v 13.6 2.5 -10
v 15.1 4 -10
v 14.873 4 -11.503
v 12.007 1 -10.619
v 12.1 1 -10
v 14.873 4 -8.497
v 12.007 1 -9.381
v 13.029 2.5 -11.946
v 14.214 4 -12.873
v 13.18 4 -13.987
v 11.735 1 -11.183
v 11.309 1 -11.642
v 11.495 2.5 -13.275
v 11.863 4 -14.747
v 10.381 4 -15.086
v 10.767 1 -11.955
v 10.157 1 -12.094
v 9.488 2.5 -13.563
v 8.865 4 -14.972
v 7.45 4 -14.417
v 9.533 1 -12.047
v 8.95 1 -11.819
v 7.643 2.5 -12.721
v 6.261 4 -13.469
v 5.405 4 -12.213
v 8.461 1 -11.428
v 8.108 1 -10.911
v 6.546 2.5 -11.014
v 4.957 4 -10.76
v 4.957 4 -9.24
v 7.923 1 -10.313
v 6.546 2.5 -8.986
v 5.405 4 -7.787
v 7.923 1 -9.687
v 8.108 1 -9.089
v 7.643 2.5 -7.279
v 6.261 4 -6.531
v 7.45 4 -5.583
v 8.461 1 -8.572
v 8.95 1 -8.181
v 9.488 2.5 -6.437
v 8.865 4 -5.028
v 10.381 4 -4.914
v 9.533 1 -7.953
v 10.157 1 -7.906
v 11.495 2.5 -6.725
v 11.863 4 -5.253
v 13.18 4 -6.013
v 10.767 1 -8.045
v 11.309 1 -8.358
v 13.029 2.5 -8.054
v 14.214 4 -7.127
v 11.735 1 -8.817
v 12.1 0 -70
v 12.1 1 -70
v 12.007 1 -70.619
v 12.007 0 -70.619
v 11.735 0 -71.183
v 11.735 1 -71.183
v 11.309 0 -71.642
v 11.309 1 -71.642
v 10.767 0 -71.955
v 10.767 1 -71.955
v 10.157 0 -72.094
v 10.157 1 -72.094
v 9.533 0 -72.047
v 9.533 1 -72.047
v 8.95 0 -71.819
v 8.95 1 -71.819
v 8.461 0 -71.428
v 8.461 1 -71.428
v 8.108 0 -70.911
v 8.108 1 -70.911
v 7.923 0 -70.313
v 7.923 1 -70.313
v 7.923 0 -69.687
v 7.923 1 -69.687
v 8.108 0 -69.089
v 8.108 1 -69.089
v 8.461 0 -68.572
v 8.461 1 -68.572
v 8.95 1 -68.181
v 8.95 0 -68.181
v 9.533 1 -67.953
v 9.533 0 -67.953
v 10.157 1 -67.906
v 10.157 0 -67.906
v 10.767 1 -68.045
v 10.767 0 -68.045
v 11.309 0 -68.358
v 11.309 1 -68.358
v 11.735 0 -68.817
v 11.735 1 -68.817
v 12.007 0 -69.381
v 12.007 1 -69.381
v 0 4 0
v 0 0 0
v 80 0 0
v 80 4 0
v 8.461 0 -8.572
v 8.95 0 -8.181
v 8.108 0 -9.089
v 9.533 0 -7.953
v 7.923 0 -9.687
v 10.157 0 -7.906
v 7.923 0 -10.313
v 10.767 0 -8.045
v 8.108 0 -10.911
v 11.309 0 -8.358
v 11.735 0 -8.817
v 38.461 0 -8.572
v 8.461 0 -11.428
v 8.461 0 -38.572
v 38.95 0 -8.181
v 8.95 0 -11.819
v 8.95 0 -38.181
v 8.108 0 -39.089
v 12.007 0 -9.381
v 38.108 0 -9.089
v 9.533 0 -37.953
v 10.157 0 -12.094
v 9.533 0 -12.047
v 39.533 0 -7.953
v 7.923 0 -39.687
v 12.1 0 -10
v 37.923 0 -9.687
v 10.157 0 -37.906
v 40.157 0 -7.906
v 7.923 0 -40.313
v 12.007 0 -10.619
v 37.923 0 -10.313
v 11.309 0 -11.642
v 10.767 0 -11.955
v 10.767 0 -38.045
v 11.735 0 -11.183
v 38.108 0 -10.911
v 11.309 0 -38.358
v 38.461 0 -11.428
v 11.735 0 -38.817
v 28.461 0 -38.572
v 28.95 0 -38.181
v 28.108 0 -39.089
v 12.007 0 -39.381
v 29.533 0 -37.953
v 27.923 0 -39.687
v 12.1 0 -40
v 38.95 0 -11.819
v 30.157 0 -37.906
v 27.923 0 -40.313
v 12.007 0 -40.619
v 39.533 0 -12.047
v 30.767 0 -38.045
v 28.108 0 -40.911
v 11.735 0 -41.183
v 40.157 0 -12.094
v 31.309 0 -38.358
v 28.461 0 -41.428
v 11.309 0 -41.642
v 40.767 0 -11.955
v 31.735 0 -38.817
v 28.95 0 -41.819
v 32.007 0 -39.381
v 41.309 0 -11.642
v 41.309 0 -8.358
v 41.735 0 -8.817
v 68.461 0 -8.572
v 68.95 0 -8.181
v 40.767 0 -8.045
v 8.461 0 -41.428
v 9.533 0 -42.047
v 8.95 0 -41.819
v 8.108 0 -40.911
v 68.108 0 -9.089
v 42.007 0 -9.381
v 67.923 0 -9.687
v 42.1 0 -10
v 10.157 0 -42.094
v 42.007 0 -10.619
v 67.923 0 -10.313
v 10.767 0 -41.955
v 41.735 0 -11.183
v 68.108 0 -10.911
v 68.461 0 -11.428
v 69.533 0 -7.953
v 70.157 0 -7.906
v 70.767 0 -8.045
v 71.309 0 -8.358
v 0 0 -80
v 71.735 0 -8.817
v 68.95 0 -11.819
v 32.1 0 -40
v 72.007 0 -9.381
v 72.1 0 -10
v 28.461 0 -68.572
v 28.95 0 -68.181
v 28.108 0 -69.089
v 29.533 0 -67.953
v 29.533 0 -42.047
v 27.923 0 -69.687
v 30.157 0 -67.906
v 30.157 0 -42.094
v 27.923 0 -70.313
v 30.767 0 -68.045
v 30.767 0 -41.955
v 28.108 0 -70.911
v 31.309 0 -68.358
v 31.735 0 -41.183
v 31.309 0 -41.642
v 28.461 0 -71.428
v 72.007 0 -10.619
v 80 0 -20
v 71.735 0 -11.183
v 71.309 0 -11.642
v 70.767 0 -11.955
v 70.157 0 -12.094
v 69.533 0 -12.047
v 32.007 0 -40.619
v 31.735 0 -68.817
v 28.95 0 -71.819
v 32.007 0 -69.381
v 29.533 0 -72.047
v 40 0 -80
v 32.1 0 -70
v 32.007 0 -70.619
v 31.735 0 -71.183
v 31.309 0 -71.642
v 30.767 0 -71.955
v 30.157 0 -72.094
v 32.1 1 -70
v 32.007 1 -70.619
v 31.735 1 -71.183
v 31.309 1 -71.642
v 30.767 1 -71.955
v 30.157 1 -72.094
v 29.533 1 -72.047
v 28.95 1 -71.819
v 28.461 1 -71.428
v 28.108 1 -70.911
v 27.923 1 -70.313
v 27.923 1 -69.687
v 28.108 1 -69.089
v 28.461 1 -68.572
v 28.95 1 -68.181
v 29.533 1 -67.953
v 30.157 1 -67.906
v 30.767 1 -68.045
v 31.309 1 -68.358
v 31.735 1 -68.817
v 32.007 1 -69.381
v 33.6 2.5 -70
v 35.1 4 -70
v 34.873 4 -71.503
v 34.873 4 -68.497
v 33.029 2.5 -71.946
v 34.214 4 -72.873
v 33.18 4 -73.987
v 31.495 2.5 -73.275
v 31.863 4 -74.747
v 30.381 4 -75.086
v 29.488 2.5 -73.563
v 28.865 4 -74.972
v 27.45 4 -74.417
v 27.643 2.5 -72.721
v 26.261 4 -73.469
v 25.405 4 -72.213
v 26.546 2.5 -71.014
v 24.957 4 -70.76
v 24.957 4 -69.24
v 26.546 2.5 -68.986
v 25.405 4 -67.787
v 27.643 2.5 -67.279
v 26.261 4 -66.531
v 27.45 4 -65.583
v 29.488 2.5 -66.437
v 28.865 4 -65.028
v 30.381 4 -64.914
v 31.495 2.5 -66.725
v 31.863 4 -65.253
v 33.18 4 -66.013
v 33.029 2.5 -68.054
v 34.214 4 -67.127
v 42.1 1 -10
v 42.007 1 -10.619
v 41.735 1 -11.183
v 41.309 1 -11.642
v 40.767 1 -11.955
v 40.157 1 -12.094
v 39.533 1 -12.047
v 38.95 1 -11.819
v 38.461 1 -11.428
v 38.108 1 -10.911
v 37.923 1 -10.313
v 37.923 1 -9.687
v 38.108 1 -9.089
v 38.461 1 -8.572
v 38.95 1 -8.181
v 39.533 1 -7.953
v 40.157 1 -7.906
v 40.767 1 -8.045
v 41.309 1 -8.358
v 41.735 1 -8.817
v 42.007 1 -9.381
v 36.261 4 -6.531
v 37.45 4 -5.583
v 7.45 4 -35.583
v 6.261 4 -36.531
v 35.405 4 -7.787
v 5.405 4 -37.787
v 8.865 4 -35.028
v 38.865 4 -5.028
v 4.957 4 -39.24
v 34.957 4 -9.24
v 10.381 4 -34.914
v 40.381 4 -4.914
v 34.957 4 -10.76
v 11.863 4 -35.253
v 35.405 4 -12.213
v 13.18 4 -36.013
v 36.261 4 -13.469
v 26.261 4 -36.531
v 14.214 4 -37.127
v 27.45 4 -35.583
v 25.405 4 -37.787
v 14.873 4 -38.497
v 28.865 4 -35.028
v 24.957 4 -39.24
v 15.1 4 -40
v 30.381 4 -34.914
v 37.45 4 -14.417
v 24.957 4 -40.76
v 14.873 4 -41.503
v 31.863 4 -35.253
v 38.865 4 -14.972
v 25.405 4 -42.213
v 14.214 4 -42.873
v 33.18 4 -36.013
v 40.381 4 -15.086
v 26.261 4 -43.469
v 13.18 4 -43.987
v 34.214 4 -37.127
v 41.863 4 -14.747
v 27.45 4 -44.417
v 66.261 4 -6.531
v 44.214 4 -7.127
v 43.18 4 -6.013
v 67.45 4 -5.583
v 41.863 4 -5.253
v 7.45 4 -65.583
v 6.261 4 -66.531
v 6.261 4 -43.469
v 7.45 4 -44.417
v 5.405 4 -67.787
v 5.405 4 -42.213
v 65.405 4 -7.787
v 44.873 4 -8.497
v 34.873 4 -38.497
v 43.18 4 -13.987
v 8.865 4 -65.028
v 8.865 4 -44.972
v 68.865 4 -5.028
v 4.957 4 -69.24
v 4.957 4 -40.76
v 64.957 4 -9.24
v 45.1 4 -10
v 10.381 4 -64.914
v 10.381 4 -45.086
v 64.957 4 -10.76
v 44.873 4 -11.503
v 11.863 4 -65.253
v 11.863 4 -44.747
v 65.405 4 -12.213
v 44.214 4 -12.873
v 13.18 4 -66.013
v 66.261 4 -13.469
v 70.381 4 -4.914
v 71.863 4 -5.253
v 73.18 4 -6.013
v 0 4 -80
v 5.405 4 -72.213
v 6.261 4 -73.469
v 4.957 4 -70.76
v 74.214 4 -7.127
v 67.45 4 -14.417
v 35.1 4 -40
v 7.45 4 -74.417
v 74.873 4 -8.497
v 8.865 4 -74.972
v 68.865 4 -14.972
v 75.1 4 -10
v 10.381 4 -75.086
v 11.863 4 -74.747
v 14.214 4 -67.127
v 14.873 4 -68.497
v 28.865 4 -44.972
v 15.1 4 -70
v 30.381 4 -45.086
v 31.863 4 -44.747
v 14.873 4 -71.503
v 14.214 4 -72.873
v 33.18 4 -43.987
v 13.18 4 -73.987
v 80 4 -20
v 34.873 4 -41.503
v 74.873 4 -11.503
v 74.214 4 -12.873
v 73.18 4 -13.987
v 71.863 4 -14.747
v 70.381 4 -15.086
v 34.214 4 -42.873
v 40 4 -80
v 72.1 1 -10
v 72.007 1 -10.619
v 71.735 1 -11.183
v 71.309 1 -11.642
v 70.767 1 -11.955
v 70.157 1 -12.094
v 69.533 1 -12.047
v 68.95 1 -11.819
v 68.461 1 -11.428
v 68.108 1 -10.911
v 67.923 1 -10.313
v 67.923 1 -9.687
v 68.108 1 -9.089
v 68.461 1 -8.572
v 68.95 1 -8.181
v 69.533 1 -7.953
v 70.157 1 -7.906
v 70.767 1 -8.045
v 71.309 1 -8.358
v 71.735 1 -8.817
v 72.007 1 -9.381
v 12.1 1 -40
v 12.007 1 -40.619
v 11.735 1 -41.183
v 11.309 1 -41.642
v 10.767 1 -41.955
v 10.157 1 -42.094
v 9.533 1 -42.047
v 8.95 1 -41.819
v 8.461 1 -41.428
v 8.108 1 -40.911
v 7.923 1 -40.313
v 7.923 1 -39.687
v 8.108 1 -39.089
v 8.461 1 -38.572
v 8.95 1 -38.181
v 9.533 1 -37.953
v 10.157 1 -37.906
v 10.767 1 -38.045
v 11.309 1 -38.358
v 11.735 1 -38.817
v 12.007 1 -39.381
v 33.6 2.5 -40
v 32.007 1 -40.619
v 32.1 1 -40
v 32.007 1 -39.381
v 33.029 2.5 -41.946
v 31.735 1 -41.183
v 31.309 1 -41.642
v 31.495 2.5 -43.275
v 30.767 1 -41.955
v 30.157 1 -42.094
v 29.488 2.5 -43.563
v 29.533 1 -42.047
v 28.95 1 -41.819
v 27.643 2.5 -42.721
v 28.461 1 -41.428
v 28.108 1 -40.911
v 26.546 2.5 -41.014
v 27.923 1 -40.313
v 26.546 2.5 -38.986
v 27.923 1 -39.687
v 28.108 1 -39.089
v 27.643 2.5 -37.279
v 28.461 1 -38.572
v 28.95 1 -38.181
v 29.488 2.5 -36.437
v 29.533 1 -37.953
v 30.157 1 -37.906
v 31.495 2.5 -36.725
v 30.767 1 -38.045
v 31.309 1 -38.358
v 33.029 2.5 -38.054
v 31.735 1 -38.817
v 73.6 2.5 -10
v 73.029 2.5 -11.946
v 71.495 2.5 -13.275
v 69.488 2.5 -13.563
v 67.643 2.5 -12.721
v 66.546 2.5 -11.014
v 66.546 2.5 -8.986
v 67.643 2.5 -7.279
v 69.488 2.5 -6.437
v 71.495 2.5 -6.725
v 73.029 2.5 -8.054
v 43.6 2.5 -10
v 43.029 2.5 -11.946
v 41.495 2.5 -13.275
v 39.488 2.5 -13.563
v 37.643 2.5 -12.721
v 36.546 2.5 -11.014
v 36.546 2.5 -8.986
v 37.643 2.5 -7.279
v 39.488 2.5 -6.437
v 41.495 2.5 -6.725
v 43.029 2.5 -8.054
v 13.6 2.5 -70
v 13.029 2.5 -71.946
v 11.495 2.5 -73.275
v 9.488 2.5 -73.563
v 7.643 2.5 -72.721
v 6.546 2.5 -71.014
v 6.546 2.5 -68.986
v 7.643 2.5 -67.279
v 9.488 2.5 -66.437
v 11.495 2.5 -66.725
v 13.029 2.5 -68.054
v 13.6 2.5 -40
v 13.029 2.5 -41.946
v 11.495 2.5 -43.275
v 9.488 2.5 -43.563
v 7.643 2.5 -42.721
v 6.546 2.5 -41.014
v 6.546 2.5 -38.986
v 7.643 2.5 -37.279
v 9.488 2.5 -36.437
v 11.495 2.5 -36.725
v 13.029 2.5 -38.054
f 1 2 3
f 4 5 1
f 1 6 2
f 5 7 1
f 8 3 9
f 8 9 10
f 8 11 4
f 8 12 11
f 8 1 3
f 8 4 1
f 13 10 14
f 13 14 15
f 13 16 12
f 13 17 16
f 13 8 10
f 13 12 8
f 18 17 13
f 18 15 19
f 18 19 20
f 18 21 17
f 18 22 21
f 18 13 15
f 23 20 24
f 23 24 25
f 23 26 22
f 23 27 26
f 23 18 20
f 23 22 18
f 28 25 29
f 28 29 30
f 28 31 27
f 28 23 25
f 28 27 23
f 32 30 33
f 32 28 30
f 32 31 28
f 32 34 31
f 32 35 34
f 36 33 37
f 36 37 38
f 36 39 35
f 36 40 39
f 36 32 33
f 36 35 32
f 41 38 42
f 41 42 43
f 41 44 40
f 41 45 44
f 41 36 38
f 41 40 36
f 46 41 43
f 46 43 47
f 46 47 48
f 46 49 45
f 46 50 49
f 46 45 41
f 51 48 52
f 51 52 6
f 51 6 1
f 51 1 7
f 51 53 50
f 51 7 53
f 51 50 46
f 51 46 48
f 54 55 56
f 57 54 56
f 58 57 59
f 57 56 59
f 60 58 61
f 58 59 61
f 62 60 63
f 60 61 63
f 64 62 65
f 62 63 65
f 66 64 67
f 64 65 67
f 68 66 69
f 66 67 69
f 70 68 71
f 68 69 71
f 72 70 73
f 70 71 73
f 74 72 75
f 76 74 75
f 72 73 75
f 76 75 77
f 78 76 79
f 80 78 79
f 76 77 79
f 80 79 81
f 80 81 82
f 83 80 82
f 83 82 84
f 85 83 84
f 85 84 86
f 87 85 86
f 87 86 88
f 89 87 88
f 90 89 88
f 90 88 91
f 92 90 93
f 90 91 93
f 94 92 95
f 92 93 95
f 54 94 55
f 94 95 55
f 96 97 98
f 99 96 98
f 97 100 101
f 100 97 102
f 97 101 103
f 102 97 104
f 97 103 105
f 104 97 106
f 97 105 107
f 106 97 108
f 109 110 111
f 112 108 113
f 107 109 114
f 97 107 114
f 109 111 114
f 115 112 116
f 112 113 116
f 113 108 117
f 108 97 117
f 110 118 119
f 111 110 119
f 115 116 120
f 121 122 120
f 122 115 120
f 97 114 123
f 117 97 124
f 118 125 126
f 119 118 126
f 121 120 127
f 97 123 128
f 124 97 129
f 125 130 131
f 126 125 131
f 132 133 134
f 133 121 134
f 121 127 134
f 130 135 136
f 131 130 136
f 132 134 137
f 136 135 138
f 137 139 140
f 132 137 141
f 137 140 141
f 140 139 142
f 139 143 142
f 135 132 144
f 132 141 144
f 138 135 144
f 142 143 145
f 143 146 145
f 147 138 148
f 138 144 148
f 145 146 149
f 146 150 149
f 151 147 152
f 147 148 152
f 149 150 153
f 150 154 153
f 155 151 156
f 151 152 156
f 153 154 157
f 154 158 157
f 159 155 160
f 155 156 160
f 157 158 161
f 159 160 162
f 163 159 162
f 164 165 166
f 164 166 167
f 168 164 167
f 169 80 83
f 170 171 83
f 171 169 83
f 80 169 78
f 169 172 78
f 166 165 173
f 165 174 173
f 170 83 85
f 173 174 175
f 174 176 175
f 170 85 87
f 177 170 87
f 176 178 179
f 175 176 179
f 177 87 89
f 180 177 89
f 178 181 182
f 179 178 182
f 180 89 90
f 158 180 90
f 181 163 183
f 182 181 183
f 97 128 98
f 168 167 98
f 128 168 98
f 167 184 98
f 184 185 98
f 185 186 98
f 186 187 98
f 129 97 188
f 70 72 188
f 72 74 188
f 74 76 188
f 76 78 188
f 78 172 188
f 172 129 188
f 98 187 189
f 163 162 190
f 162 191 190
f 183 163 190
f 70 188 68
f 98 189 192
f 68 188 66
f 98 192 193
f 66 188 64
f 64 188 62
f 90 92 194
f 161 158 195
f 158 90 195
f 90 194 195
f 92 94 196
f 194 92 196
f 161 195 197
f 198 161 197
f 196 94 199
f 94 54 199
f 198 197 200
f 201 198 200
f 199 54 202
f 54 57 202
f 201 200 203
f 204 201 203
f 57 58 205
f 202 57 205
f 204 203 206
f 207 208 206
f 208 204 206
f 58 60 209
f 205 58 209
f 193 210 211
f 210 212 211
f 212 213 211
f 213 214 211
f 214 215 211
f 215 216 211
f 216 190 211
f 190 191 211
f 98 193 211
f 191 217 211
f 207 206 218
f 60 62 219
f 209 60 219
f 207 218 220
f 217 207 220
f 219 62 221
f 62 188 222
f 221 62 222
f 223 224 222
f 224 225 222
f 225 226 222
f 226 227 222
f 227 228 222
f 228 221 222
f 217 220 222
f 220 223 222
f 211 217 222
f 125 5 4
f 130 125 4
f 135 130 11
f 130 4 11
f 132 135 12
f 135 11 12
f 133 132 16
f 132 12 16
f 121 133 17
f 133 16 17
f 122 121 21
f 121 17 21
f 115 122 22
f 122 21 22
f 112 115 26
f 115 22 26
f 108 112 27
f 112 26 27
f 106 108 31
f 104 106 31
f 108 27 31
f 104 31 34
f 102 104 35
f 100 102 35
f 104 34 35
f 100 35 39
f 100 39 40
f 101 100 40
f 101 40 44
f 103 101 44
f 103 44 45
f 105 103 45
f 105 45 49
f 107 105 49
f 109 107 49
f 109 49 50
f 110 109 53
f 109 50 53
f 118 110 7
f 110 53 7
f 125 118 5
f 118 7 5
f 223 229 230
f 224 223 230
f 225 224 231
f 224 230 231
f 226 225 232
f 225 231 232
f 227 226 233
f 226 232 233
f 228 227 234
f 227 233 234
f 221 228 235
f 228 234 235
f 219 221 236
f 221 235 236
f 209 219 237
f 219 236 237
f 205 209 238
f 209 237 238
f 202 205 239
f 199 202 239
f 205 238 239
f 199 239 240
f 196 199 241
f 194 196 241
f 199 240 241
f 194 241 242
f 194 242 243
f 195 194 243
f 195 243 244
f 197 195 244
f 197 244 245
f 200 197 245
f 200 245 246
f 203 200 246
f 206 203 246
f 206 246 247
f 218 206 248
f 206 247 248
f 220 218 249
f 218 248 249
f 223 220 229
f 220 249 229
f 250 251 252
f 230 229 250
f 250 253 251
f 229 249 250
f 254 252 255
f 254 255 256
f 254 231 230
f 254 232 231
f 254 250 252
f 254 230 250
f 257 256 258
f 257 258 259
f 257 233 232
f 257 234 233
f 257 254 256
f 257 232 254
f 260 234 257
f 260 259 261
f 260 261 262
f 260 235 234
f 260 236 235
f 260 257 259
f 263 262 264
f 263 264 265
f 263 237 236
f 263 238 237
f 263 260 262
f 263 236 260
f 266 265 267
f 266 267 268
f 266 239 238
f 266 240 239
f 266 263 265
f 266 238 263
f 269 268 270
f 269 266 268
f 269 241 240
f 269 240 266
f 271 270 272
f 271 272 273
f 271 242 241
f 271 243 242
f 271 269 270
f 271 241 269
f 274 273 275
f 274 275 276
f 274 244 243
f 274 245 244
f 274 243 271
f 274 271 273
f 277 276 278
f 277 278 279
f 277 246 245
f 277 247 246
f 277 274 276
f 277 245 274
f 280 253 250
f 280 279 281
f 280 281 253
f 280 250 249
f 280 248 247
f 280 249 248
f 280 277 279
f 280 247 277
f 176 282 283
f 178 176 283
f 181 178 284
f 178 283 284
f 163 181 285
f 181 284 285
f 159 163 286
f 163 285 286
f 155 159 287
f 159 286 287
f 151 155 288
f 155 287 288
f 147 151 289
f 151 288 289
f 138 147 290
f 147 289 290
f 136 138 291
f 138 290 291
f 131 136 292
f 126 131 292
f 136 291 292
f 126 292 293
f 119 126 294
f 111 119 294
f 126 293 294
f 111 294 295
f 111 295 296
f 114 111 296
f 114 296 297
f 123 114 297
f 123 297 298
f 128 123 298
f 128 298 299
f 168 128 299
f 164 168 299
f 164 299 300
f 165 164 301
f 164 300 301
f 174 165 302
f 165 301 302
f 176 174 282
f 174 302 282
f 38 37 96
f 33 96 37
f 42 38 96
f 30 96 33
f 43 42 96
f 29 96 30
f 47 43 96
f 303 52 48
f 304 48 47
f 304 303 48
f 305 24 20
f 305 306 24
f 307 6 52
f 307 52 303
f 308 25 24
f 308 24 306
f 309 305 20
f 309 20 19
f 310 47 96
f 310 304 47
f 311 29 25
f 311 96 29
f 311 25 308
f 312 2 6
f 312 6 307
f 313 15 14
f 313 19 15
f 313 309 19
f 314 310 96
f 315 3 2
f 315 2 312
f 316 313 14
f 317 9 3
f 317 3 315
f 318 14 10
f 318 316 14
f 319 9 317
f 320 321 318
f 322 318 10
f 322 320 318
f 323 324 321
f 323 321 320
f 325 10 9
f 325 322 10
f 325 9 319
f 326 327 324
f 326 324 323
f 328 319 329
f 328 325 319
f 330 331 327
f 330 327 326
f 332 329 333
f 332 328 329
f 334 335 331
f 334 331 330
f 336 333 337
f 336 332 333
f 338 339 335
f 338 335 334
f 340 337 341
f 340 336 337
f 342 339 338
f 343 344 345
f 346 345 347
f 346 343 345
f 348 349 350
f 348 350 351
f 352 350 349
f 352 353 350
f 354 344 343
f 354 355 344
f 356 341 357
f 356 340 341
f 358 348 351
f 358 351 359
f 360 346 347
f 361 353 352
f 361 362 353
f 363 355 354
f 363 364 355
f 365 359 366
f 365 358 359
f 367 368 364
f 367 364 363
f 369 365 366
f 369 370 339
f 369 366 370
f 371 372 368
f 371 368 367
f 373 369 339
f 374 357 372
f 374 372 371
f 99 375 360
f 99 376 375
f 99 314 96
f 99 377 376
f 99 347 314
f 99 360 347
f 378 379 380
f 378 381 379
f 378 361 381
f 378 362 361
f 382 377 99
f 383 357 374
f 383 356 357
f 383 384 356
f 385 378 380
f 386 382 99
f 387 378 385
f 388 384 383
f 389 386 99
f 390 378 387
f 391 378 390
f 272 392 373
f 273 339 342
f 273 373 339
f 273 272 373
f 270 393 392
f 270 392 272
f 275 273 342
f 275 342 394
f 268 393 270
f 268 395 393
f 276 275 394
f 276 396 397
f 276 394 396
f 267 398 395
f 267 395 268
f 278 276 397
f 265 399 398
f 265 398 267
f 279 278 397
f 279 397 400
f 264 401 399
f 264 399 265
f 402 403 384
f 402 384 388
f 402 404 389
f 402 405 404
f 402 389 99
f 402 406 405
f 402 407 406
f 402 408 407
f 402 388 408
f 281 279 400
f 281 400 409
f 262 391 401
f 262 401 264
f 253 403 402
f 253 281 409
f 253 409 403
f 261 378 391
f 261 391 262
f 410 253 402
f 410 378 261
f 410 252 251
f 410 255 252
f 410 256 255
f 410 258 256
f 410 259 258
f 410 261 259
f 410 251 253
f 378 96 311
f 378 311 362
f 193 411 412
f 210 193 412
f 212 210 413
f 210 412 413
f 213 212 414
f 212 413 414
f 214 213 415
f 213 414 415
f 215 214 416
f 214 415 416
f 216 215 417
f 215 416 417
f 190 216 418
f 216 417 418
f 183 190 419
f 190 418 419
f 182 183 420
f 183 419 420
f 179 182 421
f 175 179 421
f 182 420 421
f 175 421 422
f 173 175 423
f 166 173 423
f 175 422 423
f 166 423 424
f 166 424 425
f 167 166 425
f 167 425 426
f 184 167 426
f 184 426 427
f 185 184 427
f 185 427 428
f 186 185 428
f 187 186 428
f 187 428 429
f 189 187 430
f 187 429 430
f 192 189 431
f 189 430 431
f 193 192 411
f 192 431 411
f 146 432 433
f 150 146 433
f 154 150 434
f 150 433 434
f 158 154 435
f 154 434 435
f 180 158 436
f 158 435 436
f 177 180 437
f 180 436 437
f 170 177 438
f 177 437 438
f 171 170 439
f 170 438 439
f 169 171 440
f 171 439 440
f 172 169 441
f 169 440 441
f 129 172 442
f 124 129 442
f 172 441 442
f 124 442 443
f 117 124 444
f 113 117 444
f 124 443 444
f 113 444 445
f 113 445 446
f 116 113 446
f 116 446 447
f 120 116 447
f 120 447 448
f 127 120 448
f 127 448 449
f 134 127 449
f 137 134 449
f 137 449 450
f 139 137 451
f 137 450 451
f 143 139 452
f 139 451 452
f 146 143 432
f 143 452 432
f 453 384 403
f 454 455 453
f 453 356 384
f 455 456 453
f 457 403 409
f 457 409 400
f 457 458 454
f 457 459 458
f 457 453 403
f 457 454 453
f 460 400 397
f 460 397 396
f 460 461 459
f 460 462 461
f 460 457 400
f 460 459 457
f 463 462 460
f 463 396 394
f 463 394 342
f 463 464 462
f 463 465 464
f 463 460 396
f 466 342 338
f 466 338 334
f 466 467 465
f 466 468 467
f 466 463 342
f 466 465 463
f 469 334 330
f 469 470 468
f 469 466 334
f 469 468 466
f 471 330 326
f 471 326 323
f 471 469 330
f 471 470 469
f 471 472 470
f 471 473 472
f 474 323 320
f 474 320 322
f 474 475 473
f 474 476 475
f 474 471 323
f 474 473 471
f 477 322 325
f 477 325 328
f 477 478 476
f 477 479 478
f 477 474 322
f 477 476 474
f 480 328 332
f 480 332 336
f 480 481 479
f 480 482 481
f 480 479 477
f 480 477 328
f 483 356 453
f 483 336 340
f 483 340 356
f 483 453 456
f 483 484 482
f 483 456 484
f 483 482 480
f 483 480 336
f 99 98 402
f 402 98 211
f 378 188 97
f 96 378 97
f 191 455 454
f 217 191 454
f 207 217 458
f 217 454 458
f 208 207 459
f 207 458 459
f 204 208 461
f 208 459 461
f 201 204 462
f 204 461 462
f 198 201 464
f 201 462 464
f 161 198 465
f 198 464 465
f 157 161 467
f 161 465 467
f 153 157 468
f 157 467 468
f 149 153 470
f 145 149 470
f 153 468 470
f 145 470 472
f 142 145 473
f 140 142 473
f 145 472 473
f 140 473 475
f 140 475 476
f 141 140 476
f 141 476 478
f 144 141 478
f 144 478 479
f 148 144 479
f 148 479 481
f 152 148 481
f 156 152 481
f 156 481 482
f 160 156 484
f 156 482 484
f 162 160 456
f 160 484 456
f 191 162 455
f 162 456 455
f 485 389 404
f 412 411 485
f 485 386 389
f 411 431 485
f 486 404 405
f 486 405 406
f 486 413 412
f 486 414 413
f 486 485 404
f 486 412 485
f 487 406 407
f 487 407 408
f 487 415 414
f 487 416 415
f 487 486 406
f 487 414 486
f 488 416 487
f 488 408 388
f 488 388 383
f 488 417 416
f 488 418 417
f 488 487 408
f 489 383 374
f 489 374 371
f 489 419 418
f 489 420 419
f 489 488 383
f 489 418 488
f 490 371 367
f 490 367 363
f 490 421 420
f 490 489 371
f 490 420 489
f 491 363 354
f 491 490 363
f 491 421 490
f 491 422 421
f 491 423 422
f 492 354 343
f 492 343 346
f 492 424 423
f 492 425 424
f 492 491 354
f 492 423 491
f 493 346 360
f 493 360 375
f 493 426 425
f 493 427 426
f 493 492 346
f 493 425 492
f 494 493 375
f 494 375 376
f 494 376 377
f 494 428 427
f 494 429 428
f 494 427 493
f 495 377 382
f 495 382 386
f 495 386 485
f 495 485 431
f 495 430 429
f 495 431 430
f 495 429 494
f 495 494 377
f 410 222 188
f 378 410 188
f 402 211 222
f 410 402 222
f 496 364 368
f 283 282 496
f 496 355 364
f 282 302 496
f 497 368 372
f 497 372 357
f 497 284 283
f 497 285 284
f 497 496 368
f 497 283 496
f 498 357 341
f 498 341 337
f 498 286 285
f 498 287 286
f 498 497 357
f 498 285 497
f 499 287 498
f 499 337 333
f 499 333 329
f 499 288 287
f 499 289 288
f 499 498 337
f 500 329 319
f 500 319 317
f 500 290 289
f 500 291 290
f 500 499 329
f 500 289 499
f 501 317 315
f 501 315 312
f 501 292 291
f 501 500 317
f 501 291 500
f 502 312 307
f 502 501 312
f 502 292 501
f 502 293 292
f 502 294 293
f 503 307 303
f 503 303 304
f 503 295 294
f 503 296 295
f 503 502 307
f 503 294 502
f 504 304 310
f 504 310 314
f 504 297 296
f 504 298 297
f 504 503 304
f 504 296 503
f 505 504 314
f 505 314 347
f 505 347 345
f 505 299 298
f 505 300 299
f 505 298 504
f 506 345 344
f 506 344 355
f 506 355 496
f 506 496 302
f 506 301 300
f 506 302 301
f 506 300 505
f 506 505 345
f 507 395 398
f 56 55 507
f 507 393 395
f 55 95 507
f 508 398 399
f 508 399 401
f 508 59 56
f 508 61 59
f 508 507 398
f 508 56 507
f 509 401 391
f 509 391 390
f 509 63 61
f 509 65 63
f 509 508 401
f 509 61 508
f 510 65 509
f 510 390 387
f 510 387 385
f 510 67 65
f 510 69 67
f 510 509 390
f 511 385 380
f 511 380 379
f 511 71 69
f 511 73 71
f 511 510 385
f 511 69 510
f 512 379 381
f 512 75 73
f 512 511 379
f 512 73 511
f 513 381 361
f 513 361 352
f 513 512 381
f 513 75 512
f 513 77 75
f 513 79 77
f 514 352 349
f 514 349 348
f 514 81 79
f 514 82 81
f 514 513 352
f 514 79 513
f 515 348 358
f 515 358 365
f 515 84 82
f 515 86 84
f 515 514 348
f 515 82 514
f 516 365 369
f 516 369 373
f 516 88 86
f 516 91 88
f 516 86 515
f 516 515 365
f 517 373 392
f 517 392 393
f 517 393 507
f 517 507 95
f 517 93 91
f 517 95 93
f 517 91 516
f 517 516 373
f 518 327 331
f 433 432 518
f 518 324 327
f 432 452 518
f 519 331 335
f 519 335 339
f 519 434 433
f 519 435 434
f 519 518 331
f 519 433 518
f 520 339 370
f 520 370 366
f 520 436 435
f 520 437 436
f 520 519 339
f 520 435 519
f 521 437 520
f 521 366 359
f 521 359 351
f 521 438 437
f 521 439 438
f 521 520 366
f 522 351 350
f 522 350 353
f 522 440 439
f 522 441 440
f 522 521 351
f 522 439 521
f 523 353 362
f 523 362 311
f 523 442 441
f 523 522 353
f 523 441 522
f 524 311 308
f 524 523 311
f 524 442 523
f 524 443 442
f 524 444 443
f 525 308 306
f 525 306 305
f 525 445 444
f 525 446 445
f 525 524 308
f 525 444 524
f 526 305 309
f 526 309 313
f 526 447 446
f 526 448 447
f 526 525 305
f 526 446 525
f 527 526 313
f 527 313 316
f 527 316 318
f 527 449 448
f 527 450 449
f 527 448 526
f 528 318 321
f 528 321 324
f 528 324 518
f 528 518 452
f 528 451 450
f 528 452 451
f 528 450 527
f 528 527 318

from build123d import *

# Parameters (mm, degrees)
BOSS_EXTRUDE1_DEPTH = 4
SKETCH2_R           = 2.1
CUT_EXTRUDE1_DEPTH  = 4
CHAMFER1_SIZE       = 3


with BuildPart() as part:
    # Sketch1 → Boss-Extrude1 (new body)
    with BuildSketch(Plane(origin=(0, 0, 0), x_dir=(1, 0, 0), z_dir=(0, 1, 0))):
        Polygon((0, 0), (80, 0), (80, 20), (40, 80), (0, 80), align=None)
    extrude(amount=BOSS_EXTRUDE1_DEPTH)

    # Sketch2 → Cut-Extrude1 (cut)
    with BuildSketch(Plane(origin=(0, 4, 0), x_dir=(1, 0, 0), z_dir=(0, 1, 0))):
        with Locations((10, 10)):
            Circle(SKETCH2_R)
        with Locations((40, 10)):
            Circle(SKETCH2_R)
        with Locations((70, 10)):
            Circle(SKETCH2_R)
        with Locations((30, 40)):
            Circle(SKETCH2_R)
        with Locations((30, 70)):
            Circle(SKETCH2_R)
        with Locations((10, 40)):
            Circle(SKETCH2_R)
        with Locations((10, 70)):
            Circle(SKETCH2_R)
    extrude(amount=-CUT_EXTRUDE1_DEPTH, mode=Mode.SUBTRACT)

    # Chamfer1
    chamfer1_edges = [part.edges().sort_by_distance(p)[0] for p in [
        (7.9, 4, -70),
        (7.9, 4, -40),
        (27.9, 4, -70),
        (27.9, 4, -40),
        (67.9, 4, -10),
        (37.9, 4, -10),
        (7.9, 4, -10),
    ]]
    chamfer(chamfer1_edges, length=CHAMFER1_SIZE)


solid = part.part
